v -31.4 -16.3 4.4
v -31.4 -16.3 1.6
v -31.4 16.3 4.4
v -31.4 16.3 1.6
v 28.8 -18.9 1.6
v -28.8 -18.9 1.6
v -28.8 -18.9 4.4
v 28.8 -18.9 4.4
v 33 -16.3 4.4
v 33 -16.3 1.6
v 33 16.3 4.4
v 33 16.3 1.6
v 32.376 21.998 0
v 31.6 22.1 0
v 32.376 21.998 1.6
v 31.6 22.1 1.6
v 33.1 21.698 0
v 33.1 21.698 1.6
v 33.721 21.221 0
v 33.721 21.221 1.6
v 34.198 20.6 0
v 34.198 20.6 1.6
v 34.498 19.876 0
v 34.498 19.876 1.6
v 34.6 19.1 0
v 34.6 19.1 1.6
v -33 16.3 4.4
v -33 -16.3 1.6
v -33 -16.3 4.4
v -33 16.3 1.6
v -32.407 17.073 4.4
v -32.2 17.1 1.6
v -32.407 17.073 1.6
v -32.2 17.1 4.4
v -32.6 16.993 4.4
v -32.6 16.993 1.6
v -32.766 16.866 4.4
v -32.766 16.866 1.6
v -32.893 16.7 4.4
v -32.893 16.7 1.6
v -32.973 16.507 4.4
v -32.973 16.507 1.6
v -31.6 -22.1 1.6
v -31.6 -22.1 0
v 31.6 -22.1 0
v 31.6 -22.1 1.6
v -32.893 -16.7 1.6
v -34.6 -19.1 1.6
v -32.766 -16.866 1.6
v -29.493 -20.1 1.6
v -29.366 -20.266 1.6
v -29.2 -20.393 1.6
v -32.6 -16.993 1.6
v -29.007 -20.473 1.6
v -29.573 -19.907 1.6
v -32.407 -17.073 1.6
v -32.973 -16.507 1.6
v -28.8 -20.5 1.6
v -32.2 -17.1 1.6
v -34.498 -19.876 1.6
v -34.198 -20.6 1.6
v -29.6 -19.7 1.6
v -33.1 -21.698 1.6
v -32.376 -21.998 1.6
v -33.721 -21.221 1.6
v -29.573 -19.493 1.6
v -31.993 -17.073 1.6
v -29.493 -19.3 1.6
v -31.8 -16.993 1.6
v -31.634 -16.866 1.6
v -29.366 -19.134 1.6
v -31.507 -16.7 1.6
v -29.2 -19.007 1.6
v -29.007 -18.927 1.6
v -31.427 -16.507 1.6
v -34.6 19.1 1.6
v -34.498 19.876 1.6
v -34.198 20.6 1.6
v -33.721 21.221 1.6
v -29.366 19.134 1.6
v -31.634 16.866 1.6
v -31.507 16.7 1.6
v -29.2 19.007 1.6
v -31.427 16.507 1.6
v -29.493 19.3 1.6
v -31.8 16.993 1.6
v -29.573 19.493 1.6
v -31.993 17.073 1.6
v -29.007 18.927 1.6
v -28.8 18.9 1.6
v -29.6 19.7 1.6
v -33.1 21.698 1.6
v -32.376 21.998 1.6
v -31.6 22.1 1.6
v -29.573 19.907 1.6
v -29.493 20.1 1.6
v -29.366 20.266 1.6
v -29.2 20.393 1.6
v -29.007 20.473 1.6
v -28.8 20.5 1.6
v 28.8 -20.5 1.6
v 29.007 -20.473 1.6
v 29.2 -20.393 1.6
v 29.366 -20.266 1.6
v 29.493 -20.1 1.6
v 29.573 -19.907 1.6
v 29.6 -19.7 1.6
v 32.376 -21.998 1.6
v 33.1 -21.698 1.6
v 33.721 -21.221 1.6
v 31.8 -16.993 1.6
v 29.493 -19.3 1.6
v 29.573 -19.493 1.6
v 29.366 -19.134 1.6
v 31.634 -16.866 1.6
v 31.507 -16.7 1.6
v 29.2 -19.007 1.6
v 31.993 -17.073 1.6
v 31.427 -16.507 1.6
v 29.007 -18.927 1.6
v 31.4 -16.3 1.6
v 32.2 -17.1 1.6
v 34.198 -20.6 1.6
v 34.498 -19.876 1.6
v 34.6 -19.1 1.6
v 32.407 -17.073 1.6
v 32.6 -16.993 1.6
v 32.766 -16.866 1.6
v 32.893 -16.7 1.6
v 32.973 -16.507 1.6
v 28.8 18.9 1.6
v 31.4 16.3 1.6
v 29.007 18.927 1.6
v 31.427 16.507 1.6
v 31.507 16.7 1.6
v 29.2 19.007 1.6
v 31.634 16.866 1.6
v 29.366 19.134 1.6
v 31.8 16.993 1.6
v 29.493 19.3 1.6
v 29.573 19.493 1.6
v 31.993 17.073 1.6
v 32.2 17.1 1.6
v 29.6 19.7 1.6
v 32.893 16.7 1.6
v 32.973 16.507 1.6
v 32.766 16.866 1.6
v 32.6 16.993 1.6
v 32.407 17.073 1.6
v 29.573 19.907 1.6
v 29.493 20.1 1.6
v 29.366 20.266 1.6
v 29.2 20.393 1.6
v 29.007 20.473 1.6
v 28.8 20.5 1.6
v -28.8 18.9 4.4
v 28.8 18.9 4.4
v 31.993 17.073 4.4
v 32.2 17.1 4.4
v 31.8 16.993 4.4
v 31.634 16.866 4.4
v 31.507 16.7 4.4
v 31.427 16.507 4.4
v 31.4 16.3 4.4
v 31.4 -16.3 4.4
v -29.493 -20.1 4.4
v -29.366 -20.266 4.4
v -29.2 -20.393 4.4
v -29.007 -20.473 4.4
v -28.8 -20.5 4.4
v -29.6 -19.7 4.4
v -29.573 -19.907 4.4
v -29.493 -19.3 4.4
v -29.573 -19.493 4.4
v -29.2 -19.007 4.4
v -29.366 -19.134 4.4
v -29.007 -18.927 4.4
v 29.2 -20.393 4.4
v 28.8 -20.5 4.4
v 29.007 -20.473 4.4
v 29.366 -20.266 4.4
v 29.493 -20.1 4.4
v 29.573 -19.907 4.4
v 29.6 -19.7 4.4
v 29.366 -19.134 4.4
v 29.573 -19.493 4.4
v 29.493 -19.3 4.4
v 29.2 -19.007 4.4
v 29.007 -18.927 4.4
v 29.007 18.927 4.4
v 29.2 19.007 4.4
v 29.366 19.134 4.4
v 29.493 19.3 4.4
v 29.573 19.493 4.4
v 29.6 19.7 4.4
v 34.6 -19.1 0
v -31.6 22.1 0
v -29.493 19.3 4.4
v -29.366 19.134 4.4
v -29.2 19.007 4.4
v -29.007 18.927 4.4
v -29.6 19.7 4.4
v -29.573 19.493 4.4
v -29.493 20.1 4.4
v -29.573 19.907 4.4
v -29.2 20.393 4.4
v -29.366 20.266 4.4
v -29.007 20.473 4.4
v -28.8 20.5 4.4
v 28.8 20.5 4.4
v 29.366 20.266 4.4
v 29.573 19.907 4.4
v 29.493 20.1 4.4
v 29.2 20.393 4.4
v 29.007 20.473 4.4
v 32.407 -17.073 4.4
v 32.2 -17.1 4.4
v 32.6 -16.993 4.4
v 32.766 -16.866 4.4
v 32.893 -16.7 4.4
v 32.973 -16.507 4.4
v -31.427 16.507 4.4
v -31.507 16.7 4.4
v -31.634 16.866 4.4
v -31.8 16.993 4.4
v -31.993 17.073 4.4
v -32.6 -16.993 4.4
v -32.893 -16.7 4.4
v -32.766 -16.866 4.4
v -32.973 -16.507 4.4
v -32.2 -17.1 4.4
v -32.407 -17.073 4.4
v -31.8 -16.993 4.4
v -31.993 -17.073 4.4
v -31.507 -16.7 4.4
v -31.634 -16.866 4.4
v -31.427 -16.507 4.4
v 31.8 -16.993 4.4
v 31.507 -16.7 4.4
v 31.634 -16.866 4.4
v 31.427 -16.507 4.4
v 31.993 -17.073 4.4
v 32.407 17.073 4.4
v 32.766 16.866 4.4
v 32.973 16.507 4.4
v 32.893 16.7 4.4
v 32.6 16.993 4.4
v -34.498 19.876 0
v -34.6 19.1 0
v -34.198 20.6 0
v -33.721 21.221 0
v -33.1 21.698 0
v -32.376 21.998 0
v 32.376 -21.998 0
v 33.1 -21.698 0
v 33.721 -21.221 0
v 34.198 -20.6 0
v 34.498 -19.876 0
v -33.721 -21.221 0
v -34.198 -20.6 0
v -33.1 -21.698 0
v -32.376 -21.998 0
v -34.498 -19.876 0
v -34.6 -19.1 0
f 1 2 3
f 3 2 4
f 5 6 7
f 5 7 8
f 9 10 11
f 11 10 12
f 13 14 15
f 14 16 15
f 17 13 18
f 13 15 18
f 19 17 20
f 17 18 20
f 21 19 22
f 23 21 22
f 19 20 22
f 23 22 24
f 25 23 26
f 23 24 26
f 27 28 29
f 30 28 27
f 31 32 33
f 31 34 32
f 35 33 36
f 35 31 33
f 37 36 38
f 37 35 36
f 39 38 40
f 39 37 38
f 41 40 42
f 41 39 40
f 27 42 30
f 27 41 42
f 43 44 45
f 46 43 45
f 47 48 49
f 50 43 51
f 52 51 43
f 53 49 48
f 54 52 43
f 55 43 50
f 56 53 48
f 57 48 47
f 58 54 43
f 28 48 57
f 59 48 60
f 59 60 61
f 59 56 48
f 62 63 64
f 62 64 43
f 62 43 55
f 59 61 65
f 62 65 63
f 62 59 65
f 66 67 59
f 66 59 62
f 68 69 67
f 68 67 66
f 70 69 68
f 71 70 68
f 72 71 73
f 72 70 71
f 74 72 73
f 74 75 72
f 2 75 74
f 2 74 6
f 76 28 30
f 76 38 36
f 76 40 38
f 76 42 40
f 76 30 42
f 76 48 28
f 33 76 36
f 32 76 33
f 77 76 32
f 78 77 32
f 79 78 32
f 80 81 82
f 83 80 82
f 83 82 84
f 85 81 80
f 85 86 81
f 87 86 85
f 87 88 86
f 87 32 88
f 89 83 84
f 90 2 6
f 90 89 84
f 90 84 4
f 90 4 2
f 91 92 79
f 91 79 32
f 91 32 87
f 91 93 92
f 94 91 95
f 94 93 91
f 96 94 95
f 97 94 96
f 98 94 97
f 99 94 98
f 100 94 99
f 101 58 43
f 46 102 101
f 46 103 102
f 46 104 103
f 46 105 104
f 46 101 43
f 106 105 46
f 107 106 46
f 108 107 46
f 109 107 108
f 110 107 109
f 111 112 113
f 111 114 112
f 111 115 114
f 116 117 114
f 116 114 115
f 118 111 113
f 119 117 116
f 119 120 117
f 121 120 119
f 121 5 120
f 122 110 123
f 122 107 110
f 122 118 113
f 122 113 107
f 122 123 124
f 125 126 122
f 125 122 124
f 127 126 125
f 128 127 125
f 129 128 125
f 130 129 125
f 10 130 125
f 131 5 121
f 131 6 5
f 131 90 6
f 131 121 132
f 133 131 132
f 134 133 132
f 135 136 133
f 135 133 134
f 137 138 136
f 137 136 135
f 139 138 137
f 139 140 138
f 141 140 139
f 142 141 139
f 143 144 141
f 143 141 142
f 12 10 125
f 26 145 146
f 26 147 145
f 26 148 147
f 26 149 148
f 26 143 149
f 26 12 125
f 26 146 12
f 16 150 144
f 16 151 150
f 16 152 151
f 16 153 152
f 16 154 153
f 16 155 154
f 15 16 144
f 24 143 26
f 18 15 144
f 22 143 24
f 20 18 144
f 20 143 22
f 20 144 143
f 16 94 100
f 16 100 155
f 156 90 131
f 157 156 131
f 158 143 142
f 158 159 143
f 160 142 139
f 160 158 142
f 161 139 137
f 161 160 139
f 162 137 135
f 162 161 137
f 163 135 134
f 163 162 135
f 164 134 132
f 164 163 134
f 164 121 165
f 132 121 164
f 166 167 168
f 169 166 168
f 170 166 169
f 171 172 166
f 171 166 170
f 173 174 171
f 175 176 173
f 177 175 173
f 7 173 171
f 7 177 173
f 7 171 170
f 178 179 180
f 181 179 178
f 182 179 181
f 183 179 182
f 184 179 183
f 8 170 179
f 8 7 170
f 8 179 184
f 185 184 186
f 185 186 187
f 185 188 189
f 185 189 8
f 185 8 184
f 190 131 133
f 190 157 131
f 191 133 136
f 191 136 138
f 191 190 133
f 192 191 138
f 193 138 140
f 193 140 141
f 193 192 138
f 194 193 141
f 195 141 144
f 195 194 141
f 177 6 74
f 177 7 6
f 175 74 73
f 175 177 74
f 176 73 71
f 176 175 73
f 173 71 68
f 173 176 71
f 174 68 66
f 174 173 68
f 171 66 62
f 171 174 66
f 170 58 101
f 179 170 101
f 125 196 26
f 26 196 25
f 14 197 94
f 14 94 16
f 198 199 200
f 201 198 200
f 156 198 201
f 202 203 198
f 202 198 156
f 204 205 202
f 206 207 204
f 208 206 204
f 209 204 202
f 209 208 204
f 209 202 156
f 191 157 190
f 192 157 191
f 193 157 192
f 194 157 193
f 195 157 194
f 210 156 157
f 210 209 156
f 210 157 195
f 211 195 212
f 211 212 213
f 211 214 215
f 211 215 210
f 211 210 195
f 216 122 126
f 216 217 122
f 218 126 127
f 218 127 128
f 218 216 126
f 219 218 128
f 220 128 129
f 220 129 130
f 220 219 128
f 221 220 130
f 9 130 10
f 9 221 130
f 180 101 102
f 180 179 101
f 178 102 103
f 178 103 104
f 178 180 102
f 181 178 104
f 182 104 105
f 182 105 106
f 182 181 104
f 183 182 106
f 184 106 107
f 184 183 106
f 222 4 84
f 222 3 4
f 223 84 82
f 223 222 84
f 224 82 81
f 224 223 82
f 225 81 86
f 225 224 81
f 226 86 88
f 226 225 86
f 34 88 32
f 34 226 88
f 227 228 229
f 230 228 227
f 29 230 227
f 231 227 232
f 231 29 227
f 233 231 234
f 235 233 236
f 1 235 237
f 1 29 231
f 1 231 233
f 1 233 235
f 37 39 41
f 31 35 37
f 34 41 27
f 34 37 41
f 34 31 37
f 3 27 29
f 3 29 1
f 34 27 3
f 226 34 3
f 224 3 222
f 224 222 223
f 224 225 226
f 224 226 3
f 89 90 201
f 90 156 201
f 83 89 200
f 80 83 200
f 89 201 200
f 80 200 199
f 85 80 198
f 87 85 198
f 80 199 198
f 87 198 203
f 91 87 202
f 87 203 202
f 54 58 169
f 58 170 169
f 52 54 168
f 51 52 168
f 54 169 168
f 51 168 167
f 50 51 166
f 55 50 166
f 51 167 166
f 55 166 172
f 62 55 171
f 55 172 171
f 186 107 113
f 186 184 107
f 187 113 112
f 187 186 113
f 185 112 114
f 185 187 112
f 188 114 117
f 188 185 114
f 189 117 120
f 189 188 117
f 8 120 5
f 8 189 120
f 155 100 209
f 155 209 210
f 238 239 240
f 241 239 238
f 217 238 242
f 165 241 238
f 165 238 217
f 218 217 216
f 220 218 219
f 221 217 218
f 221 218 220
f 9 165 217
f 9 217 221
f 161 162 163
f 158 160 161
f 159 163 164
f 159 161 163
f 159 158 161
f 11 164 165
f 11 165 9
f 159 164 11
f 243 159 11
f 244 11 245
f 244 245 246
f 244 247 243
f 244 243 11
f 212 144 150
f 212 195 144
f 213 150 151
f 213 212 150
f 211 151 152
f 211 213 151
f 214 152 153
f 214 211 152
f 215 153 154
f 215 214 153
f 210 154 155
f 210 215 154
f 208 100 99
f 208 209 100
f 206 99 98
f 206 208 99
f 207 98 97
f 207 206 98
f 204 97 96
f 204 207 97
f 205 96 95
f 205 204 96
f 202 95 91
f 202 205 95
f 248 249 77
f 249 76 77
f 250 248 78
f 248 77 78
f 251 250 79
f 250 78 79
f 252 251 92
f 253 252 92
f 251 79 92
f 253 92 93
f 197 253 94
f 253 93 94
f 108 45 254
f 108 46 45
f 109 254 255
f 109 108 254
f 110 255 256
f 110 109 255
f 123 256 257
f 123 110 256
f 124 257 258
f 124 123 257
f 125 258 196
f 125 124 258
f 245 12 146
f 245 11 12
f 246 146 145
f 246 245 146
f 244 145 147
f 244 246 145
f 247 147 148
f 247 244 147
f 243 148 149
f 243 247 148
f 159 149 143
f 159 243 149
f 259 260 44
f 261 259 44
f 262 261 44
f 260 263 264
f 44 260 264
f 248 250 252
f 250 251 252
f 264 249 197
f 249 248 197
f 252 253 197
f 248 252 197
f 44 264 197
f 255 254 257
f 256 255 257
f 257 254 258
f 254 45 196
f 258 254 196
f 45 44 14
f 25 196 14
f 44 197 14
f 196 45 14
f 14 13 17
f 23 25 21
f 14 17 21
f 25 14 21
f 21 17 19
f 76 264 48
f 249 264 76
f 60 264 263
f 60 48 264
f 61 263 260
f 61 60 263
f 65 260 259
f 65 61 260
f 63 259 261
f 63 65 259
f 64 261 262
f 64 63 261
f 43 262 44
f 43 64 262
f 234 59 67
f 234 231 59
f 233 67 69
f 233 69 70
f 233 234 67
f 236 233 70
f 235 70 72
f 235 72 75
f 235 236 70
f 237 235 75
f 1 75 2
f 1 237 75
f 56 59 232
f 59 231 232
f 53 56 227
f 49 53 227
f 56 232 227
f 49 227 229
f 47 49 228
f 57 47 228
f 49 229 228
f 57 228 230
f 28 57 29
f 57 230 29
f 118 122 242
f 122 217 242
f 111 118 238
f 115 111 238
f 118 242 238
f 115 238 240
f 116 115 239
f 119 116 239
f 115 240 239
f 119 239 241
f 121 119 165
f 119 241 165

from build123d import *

# Parameters (mm, degrees)
F0_W     = 69.2
F0_H     = 44.2
F1_DEPTH = 1.6
F2_W     = 59.2
F2_H     = 1.6
F2_W_2   = 1.6
F2_H_2   = 34.2
F3_DEPTH = 2.8
F4_R     = 3
F5_R     = 0.79999


# Not quite as in the source:
# - a fillet or chamfer is up to 0.001 mm smaller than in the source, because OpenCascade refuses the exact size


with BuildPart() as f1:
    # F0 (on Top) → F1 (new body)
    with BuildSketch(Plane.XY):
        Rectangle(F0_W, F0_H)
    extrude(amount=F1_DEPTH)

    # F2 (on face) → F3 (join)
    with BuildSketch(Plane.XY.offset(1.6)):
        with Locations((0, -19.7)):
            Rectangle(F2_W, F2_H)
        with Locations((-32.2, 0)):
            Rectangle(F2_W_2, F2_H_2)
        with Locations((32.2, 0)):
            Rectangle(F2_W_2, F2_H_2)
        with Locations((0, 19.7)):
            Rectangle(F2_W, F2_H)
    extrude(amount=F3_DEPTH)

    # F4
    f4_edges = [f1.edges().sort_by_distance(p)[0] for p in [
        (34.6, -22.1, 0.8),
        (34.6, 22.1, 0.8),
        (-34.6, -22.1, 0.8),
        (-34.6, 22.1, 0.8),
    ]]
    fillet(f4_edges, radius=F4_R)

    # F5 (radius 0.8 in the source; OpenCascade refuses exactly that, so slightly less here)
    f5_edges = [f1.edges().sort_by_distance(p)[0] for p in [
        (29.6, -20.5, 3),
        (29.6, -18.9, 3),
        (33, -17.1, 3),
        (31.4, -17.1, 3),
        (29.6, 18.9, 3),
        (29.6, 20.5, 3),
        (-33, -17.1, 3),
        (-31.4, 17.1, 3),
        (-31.4, -17.1, 3),
        (-29.6, 18.9, 3),
        (31.4, 17.1, 3),
        (33, 17.1, 3),
        (-33, 17.1, 3),
        (-29.6, -18.9, 3),
        (-29.6, 20.5, 3),
        (-29.6, -20.5, 3),
    ]]
    fillet(f5_edges, radius=F5_R)


solid = f1.part
